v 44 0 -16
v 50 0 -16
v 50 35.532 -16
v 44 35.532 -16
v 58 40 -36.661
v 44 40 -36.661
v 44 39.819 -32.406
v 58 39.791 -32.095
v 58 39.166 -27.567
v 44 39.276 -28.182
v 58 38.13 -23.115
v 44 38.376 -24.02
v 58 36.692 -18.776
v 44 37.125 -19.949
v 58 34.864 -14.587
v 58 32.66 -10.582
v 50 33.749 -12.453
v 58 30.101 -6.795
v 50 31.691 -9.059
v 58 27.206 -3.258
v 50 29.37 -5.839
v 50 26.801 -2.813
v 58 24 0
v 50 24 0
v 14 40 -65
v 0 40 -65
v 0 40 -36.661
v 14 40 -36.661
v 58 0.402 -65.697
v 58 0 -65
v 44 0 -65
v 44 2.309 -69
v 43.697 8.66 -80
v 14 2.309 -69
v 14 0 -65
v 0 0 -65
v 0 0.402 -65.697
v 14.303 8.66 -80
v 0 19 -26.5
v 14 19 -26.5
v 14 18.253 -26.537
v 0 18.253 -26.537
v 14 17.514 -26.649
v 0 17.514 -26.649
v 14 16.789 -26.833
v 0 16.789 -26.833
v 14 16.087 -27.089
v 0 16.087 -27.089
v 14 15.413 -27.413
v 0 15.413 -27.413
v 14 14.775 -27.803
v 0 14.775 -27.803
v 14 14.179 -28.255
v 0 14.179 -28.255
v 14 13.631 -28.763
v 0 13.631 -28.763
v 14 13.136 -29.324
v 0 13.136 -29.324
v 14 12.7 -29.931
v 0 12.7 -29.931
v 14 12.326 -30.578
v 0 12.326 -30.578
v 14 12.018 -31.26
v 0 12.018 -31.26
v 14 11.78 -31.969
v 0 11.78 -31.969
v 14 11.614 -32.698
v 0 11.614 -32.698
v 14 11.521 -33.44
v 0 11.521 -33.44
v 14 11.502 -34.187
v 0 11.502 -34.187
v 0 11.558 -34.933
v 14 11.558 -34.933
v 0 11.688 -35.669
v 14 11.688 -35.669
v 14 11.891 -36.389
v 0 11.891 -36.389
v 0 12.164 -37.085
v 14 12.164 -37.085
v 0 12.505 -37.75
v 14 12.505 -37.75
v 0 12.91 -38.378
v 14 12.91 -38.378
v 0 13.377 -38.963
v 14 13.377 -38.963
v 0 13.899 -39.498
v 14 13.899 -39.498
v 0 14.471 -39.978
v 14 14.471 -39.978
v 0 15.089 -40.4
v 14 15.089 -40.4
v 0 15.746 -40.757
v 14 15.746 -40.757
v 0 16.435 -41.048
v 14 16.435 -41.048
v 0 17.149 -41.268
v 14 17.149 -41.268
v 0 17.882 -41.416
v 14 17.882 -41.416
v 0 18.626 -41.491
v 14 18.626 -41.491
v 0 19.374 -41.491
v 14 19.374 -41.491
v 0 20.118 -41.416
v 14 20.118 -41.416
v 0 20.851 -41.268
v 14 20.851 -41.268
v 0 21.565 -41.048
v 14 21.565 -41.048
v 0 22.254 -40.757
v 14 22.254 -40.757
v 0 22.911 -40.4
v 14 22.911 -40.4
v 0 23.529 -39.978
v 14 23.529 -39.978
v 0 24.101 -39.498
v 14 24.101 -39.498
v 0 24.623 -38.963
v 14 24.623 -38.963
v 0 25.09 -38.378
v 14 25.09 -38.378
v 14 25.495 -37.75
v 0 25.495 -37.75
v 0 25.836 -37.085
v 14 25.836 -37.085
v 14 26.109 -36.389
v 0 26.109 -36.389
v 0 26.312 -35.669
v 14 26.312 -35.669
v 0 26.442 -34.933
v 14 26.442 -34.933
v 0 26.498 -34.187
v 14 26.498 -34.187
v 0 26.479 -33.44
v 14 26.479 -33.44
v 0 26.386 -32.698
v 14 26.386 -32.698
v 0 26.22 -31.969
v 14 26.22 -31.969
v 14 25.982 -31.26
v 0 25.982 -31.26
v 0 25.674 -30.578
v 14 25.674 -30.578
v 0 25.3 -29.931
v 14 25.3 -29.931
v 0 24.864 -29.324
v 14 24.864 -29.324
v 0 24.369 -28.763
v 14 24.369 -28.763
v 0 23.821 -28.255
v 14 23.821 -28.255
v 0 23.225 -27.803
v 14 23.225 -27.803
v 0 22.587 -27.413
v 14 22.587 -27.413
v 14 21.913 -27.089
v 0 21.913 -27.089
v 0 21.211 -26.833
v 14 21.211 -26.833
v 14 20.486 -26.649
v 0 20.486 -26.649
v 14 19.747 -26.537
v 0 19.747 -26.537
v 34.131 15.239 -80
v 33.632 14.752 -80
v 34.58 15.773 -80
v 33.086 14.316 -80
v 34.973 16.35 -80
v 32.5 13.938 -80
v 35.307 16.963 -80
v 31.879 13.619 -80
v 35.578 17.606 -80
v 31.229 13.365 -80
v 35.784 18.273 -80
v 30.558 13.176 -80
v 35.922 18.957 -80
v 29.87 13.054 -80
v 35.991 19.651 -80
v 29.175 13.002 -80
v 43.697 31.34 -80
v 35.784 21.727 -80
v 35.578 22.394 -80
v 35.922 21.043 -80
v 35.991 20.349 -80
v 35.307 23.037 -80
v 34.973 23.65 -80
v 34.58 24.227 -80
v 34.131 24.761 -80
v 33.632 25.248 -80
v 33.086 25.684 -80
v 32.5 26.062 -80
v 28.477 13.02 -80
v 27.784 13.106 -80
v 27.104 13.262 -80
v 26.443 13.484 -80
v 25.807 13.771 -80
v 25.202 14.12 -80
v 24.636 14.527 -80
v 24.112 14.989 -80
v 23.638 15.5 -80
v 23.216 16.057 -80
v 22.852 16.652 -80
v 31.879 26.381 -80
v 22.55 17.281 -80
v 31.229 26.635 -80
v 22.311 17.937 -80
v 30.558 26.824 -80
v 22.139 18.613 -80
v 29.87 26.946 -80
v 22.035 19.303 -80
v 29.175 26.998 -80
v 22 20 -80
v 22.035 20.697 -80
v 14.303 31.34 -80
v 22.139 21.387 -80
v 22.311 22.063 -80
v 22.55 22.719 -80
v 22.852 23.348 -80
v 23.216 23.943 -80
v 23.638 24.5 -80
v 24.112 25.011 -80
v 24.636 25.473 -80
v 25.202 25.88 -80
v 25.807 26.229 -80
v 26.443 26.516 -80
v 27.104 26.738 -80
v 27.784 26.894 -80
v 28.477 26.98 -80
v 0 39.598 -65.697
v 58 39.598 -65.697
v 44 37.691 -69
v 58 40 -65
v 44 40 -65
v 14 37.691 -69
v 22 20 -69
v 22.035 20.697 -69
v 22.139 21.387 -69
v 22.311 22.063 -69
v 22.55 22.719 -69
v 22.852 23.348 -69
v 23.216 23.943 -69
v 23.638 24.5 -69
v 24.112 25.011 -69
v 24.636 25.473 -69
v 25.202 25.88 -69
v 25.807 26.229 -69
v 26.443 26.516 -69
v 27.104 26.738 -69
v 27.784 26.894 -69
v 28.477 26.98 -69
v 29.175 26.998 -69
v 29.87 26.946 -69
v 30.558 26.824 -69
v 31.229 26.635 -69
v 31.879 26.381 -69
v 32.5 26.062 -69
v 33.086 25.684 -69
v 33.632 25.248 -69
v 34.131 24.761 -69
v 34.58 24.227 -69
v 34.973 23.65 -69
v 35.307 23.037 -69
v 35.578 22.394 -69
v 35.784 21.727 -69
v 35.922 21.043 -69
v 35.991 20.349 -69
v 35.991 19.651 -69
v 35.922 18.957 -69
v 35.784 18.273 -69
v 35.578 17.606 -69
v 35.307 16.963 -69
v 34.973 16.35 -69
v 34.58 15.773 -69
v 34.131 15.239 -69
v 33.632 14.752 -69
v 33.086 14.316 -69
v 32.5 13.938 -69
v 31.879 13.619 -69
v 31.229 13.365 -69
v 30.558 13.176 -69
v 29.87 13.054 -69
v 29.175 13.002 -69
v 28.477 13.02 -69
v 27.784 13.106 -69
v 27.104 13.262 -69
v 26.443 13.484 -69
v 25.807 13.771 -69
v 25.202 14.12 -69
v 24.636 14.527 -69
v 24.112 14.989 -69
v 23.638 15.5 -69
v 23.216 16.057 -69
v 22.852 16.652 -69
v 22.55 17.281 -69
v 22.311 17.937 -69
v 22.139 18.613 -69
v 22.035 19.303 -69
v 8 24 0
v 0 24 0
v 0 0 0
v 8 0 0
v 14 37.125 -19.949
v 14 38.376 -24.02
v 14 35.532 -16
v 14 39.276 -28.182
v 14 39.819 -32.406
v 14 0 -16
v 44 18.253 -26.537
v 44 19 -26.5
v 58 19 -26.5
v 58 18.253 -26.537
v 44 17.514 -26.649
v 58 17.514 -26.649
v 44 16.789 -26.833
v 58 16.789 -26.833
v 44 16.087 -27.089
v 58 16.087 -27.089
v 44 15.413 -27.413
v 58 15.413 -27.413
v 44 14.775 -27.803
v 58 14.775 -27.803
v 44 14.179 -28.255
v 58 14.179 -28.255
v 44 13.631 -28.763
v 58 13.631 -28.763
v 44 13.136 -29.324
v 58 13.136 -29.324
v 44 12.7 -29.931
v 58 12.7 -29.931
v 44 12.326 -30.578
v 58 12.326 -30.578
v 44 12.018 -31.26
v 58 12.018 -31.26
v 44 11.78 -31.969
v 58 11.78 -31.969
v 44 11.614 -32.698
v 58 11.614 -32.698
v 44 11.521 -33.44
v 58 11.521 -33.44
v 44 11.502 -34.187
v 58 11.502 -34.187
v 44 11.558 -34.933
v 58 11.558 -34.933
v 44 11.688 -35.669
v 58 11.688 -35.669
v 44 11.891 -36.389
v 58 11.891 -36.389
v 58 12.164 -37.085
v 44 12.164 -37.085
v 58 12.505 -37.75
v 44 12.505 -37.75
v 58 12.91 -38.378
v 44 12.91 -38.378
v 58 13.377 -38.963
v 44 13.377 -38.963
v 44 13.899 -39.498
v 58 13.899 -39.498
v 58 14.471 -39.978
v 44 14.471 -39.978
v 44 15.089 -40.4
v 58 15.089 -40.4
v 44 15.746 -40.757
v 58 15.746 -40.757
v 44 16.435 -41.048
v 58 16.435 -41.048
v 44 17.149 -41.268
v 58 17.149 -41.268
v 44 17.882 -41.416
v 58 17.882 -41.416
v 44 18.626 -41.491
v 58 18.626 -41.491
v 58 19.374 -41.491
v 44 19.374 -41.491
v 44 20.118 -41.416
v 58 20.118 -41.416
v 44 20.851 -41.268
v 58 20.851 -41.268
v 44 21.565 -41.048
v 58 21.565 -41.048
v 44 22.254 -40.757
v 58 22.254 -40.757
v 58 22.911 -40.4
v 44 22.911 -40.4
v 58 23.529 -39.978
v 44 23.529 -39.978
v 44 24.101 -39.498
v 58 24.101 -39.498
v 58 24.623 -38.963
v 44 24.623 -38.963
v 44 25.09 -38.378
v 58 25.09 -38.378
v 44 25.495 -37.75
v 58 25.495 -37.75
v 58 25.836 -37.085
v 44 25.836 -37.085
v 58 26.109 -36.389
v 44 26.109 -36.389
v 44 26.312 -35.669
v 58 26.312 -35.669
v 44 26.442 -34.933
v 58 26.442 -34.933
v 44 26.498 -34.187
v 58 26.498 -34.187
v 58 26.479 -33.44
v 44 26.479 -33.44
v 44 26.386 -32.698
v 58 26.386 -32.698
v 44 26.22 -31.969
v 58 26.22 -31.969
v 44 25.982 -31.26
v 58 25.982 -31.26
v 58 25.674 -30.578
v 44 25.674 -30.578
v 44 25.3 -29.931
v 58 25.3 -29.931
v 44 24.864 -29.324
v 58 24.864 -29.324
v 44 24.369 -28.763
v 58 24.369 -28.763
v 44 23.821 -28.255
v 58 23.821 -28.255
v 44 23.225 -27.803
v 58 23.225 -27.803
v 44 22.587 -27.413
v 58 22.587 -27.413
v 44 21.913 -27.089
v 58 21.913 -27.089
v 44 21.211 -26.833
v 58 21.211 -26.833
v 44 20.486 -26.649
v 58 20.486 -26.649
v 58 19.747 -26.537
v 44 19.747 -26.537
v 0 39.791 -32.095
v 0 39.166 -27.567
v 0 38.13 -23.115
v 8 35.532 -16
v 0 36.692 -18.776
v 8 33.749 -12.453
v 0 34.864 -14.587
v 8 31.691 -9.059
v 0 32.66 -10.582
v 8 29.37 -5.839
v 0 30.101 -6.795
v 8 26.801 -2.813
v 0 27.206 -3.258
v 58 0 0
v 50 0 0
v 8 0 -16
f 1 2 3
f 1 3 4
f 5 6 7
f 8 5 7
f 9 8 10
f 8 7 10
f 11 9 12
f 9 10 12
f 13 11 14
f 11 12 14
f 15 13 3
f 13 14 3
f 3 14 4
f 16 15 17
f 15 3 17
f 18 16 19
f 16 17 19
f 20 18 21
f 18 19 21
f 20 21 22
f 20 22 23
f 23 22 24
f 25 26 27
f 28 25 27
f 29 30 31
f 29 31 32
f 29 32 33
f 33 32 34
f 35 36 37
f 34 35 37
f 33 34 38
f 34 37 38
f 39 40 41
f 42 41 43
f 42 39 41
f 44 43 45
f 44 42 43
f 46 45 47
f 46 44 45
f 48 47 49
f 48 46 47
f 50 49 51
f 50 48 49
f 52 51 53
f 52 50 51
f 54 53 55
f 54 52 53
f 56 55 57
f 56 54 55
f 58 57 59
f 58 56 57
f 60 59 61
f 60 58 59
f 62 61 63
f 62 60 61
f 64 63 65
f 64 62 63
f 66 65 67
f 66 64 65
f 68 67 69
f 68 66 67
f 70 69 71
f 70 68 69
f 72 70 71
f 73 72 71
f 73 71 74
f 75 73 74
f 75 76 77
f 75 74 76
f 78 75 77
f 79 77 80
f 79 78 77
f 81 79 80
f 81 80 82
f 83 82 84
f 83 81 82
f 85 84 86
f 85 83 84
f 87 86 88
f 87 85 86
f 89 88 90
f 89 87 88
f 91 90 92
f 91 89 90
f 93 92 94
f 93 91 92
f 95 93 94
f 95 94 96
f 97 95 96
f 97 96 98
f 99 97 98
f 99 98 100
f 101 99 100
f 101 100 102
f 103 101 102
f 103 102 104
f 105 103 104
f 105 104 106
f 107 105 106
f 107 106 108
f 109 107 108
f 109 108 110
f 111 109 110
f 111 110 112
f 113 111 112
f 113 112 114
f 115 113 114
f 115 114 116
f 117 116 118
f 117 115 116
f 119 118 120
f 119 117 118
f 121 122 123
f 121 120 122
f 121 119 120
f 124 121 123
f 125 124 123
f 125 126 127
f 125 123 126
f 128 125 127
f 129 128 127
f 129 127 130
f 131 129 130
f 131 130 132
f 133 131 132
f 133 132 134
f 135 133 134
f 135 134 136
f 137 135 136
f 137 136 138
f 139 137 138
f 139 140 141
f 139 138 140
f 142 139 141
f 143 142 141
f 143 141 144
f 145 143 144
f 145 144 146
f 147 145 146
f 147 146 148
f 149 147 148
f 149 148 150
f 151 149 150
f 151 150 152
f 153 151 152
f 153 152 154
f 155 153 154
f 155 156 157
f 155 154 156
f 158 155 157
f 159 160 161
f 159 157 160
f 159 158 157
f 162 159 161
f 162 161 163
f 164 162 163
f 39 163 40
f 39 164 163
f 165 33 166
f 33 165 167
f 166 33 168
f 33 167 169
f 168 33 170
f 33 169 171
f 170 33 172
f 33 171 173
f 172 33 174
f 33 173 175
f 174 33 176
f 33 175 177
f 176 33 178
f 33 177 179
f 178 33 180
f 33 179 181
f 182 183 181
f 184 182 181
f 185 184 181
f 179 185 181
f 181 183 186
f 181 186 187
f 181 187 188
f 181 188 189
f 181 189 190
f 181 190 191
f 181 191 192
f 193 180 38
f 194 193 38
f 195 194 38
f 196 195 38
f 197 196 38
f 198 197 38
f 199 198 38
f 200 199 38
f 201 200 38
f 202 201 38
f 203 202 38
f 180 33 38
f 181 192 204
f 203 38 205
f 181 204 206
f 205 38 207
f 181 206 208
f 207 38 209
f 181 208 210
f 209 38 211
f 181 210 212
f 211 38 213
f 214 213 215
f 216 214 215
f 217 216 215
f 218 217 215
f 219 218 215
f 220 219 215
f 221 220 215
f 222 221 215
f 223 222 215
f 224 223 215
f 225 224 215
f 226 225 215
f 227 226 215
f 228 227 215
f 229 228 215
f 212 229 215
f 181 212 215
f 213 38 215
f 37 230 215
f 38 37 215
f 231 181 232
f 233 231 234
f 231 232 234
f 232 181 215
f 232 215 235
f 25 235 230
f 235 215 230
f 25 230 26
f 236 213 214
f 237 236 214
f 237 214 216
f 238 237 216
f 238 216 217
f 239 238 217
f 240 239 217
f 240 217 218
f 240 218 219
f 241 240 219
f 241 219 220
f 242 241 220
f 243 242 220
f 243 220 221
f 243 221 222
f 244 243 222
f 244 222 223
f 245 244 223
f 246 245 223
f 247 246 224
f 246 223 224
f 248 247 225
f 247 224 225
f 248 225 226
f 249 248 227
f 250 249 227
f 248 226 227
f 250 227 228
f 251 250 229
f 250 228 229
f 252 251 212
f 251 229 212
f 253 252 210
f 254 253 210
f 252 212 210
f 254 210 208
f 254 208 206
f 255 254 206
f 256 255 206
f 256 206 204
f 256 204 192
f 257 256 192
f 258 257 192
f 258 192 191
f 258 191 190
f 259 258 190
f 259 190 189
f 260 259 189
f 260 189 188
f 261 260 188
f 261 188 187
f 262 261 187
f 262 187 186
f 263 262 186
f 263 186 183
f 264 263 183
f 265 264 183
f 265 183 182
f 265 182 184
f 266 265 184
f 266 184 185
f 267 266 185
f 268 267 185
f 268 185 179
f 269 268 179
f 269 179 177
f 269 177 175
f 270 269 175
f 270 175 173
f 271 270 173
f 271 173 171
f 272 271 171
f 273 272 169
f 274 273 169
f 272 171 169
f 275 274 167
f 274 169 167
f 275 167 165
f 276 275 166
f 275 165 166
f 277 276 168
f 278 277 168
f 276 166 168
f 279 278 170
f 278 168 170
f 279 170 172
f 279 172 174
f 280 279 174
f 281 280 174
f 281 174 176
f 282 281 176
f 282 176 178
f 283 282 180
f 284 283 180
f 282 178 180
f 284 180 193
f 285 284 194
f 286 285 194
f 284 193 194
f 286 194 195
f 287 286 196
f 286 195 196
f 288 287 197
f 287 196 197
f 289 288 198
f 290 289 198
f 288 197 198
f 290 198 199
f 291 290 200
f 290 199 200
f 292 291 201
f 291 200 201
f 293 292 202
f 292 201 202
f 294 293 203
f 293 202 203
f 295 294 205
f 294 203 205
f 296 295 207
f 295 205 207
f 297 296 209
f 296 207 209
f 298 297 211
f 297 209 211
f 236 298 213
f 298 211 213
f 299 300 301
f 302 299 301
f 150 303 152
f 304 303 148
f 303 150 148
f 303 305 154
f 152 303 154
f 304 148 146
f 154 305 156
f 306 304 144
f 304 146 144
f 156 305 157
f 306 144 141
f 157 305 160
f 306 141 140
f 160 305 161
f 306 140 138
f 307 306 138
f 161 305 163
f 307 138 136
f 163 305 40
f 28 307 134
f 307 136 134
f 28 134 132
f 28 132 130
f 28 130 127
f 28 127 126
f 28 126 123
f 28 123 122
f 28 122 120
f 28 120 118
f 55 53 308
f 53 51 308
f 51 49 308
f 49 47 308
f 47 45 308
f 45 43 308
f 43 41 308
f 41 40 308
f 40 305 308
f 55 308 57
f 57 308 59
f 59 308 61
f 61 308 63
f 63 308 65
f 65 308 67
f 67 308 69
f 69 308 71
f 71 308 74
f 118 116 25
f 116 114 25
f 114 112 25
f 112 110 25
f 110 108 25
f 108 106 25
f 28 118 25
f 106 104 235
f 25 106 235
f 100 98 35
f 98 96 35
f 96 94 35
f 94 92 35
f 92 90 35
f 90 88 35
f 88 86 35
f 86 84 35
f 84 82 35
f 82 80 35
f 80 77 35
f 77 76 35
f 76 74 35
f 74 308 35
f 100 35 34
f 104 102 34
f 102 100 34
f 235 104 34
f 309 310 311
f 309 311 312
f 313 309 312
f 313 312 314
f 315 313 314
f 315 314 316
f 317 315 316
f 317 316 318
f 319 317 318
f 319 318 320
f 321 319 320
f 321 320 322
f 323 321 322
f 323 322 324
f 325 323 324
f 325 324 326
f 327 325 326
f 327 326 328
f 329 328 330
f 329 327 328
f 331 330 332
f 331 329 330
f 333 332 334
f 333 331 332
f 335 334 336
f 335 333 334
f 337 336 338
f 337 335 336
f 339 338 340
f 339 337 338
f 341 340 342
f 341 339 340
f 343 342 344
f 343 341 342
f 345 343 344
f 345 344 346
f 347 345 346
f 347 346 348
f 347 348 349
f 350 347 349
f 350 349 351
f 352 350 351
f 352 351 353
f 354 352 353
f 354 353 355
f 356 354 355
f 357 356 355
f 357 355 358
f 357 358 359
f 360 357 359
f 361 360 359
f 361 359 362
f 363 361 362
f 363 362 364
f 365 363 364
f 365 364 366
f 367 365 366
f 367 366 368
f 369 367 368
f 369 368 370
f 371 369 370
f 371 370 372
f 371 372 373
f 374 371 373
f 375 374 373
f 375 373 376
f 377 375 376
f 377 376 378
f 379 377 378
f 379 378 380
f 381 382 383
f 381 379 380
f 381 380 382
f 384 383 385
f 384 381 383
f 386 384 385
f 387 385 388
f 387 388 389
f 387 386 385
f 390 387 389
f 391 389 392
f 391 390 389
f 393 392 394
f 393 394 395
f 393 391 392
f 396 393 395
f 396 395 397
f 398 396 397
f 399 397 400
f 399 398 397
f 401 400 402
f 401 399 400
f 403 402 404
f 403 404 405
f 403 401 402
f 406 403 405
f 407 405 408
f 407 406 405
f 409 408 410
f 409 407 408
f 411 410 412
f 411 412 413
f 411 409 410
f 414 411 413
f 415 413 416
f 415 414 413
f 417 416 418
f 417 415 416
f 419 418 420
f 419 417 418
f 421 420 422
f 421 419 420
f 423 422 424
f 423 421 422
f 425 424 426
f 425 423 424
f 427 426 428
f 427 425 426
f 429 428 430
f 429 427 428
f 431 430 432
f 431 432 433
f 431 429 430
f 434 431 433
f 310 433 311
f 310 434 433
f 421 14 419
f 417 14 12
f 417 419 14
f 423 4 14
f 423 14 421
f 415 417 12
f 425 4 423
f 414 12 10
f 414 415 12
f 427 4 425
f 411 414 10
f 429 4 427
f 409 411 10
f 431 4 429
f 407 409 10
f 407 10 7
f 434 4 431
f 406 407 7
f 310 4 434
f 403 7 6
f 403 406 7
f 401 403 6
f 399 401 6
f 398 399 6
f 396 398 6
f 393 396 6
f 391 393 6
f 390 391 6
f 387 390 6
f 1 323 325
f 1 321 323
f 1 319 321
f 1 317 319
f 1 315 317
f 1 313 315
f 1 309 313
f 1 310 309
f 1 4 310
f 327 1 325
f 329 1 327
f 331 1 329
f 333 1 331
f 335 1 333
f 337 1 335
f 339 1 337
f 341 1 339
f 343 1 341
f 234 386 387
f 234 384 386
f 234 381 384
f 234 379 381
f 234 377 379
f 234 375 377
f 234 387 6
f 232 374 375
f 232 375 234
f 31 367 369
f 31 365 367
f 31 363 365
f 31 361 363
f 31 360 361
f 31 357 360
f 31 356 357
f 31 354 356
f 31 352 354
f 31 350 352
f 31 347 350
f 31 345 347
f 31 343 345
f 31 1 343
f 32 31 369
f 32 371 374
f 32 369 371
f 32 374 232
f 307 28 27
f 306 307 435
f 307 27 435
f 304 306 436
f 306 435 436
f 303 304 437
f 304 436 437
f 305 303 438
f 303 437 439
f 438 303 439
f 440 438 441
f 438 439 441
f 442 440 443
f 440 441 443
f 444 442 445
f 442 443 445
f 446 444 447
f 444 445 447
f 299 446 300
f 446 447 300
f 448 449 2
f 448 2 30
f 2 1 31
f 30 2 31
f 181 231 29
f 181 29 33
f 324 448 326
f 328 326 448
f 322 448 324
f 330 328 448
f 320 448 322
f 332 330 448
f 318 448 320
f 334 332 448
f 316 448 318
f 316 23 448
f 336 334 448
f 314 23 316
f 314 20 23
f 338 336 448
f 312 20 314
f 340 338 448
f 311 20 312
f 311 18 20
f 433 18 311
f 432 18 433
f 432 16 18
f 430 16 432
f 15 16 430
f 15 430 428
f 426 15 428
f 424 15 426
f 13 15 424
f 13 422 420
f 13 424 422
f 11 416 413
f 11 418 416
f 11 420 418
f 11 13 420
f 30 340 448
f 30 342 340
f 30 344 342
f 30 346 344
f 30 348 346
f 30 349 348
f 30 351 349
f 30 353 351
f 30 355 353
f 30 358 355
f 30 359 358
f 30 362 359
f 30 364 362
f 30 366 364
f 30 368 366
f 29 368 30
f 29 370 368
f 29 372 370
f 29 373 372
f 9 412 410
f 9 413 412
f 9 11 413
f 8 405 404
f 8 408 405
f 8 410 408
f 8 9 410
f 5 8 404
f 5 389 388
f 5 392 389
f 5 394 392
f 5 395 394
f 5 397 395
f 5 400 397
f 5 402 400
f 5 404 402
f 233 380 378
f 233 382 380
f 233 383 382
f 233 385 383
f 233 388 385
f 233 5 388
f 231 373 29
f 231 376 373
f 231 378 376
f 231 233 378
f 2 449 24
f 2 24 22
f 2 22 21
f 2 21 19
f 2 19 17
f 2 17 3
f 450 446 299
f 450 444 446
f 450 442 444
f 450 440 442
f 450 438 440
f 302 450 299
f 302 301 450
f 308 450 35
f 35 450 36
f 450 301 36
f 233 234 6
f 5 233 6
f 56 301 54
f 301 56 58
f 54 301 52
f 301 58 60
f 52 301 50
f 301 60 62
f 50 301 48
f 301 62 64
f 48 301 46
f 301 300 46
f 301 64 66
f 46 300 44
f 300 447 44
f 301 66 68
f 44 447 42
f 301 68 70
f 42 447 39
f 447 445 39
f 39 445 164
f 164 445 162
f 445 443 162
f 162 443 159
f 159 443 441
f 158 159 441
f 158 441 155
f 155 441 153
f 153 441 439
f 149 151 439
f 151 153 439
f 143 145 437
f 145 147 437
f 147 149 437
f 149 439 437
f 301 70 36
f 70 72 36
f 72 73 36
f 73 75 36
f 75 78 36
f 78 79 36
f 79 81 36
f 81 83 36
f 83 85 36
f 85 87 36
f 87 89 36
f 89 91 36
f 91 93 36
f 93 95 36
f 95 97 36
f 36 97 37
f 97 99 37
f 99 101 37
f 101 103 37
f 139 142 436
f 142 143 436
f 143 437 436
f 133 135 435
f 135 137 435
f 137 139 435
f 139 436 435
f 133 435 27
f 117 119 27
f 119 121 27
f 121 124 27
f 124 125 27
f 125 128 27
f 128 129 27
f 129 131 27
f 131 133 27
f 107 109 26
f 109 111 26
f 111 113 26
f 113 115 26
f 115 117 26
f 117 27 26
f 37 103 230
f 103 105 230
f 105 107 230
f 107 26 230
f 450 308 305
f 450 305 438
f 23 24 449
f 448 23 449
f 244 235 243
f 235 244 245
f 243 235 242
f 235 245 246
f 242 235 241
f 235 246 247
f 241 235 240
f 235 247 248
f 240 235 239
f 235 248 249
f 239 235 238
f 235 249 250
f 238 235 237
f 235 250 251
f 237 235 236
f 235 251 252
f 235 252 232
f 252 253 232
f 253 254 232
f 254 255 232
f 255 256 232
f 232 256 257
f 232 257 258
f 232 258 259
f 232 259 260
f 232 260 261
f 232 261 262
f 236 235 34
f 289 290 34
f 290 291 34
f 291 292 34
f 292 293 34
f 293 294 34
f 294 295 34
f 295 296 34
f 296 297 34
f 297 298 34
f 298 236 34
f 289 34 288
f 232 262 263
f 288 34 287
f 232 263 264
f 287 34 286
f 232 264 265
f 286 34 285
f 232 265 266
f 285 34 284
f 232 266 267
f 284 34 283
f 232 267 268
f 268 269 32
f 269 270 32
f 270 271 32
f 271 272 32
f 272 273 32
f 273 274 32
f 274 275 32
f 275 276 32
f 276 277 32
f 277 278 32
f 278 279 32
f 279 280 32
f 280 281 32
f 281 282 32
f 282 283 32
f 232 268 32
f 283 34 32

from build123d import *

# Parameters (mm, degrees)
SKETCH1_R                           = 7.5
BOSS_EXTRUDE1_DEPTH                 = 58
CUT_EXTRUDE1_DEPTH                  = 107.60206377
CUT_EXTRUDE1_DEPTH_BACK             = 10
SKETCH3_W                           = 30
SKETCH3_H                           = 53
CUT_EXTRUDE3_DEPTH                  = 107.60206377
CUT_EXTRUDE3_DIRECTION_2_REACH      = 108.602
CUT_EXTRUDE3_DIRECTION_2_END_RADIUS = 50
CUT_EXTRUDE4_DEPTH                  = 107.60206377
SKETCH8_R                           = 7
CUT_EXTRUDE5_DEPTH                  = 107.60206377


with BuildPart() as part:
    # Sketch1 → Boss-Extrude1 (new body)
    with BuildSketch(Plane(origin=(0, 0, 0), x_dir=(0, 0, -1), z_dir=(1, 0, 0))):
        with BuildLine():
            Line((0, 0), (65, 0))
            Line((65, 0), (80, 8.660254038))
            Line((80, 8.660254038), (80, 31.339745962))
            Line((80, 31.339745962), (65, 40))
            Line((65, 40), (36.66060556, 40))
            ThreePointArc((36.66060556, 40), (16.66060556, 35.82575695), (0, 24))
            Line((0, 24), (0, 0))
        make_face()
        with Locations(Location((34, 19, 0), (0, 0, 180))):
            Circle(SKETCH1_R, mode=Mode.SUBTRACT)
    extrude(amount=BOSS_EXTRUDE1_DEPTH)

    # Sketch3 → Cut-Extrude1 (cut, two sides: drawn at the far end of the back side and taken through both)
    with BuildSketch(Plane(origin=(0, 0, 0), x_dir=(1, 0, 0), z_dir=(0, 1, 0)).offset(-CUT_EXTRUDE1_DEPTH_BACK)):
        with Locations((29, 42.5)):
            Rectangle(SKETCH3_W, SKETCH3_H)
    extrude(amount=CUT_EXTRUDE1_DEPTH + CUT_EXTRUDE1_DEPTH_BACK, mode=Mode.SUBTRACT)

    # Sketch5 → Cut-Extrude3 (cut)
    with BuildSketch(Plane(origin=(0, 0, 0), x_dir=(1, 0, 0), z_dir=(0, 1, 0))):
        Polygon((29, 0), (29, 16), (14, 16), (8, 16), (8, 0), align=None)
        Polygon((44, 16), (29, 16), (29, 0), (50, 0), (50, 16), align=None)
    extrude(amount=-CUT_EXTRUDE3_DEPTH, mode=Mode.SUBTRACT)

    # Cut-Extrude3 direction 2: up to this cylinder (the profile starts inside it)
    cut_extrude3_direction_2_end = Plane(origin=(29, -10, -36.66060556), z_dir=(-1, 0, 0)) * Cylinder(CUT_EXTRUDE3_DIRECTION_2_END_RADIUS, 339.204, mode=Mode.PRIVATE)
    # Sketch5 → Cut-Extrude3 direction 2 (cut, up to the surface)
    with BuildSketch(Plane(origin=(0, 0, 0), x_dir=(1, 0, 0), z_dir=(0, 1, 0)), mode=Mode.PRIVATE) as cut_extrude3_direction_2_sk1:
        Polygon((29, 0), (29, 16), (14, 16), (8, 16), (8, 0), align=None)
    cut_extrude3_direction_2_tool1 = extrude(cut_extrude3_direction_2_sk1.sketch, amount=CUT_EXTRUDE3_DIRECTION_2_REACH, mode=Mode.PRIVATE) & cut_extrude3_direction_2_end
    add(cut_extrude3_direction_2_tool1.solids().sort_by_distance((18.5, 0, -8))[0], mode=Mode.SUBTRACT)
    # Sketch5 → Cut-Extrude3 direction 2 (cut, up to the surface)
    with BuildSketch(Plane(origin=(0, 0, 0), x_dir=(1, 0, 0), z_dir=(0, 1, 0)), mode=Mode.PRIVATE) as cut_extrude3_direction_2_sk2:
        Polygon((44, 16), (29, 16), (29, 0), (50, 0), (50, 16), align=None)
    cut_extrude3_direction_2_tool2 = extrude(cut_extrude3_direction_2_sk2.sketch, amount=CUT_EXTRUDE3_DIRECTION_2_REACH, mode=Mode.PRIVATE) & cut_extrude3_direction_2_end
    add(cut_extrude3_direction_2_tool2.solids().sort_by_distance((39.5, 0, -8))[0], mode=Mode.SUBTRACT)

    # Sketch7 → Cut-Extrude4 (cut, through all)
    with BuildSketch(Plane(origin=(0, 0, 0), x_dir=(1, 0, 0), z_dir=(0, 1, 0))):
        Polygon((0, 65.69666313), (14.30333687, 80), (0, 80), align=None)
        Polygon((58, 65.69666313), (43.69666313, 80), (58, 80), align=None)
    extrude(amount=CUT_EXTRUDE4_DEPTH, mode=Mode.SUBTRACT)

    # Sketch8 → Cut-Extrude5 (cut, through all)
    with BuildSketch(Plane(origin=(0, 0, -80), x_dir=(-1, 0, 0), z_dir=(0, 0, -1))):
        with Locations((-29, 20)):
            Circle(SKETCH8_R)
    extrude(amount=-CUT_EXTRUDE5_DEPTH, mode=Mode.SUBTRACT)


solid = part.part
